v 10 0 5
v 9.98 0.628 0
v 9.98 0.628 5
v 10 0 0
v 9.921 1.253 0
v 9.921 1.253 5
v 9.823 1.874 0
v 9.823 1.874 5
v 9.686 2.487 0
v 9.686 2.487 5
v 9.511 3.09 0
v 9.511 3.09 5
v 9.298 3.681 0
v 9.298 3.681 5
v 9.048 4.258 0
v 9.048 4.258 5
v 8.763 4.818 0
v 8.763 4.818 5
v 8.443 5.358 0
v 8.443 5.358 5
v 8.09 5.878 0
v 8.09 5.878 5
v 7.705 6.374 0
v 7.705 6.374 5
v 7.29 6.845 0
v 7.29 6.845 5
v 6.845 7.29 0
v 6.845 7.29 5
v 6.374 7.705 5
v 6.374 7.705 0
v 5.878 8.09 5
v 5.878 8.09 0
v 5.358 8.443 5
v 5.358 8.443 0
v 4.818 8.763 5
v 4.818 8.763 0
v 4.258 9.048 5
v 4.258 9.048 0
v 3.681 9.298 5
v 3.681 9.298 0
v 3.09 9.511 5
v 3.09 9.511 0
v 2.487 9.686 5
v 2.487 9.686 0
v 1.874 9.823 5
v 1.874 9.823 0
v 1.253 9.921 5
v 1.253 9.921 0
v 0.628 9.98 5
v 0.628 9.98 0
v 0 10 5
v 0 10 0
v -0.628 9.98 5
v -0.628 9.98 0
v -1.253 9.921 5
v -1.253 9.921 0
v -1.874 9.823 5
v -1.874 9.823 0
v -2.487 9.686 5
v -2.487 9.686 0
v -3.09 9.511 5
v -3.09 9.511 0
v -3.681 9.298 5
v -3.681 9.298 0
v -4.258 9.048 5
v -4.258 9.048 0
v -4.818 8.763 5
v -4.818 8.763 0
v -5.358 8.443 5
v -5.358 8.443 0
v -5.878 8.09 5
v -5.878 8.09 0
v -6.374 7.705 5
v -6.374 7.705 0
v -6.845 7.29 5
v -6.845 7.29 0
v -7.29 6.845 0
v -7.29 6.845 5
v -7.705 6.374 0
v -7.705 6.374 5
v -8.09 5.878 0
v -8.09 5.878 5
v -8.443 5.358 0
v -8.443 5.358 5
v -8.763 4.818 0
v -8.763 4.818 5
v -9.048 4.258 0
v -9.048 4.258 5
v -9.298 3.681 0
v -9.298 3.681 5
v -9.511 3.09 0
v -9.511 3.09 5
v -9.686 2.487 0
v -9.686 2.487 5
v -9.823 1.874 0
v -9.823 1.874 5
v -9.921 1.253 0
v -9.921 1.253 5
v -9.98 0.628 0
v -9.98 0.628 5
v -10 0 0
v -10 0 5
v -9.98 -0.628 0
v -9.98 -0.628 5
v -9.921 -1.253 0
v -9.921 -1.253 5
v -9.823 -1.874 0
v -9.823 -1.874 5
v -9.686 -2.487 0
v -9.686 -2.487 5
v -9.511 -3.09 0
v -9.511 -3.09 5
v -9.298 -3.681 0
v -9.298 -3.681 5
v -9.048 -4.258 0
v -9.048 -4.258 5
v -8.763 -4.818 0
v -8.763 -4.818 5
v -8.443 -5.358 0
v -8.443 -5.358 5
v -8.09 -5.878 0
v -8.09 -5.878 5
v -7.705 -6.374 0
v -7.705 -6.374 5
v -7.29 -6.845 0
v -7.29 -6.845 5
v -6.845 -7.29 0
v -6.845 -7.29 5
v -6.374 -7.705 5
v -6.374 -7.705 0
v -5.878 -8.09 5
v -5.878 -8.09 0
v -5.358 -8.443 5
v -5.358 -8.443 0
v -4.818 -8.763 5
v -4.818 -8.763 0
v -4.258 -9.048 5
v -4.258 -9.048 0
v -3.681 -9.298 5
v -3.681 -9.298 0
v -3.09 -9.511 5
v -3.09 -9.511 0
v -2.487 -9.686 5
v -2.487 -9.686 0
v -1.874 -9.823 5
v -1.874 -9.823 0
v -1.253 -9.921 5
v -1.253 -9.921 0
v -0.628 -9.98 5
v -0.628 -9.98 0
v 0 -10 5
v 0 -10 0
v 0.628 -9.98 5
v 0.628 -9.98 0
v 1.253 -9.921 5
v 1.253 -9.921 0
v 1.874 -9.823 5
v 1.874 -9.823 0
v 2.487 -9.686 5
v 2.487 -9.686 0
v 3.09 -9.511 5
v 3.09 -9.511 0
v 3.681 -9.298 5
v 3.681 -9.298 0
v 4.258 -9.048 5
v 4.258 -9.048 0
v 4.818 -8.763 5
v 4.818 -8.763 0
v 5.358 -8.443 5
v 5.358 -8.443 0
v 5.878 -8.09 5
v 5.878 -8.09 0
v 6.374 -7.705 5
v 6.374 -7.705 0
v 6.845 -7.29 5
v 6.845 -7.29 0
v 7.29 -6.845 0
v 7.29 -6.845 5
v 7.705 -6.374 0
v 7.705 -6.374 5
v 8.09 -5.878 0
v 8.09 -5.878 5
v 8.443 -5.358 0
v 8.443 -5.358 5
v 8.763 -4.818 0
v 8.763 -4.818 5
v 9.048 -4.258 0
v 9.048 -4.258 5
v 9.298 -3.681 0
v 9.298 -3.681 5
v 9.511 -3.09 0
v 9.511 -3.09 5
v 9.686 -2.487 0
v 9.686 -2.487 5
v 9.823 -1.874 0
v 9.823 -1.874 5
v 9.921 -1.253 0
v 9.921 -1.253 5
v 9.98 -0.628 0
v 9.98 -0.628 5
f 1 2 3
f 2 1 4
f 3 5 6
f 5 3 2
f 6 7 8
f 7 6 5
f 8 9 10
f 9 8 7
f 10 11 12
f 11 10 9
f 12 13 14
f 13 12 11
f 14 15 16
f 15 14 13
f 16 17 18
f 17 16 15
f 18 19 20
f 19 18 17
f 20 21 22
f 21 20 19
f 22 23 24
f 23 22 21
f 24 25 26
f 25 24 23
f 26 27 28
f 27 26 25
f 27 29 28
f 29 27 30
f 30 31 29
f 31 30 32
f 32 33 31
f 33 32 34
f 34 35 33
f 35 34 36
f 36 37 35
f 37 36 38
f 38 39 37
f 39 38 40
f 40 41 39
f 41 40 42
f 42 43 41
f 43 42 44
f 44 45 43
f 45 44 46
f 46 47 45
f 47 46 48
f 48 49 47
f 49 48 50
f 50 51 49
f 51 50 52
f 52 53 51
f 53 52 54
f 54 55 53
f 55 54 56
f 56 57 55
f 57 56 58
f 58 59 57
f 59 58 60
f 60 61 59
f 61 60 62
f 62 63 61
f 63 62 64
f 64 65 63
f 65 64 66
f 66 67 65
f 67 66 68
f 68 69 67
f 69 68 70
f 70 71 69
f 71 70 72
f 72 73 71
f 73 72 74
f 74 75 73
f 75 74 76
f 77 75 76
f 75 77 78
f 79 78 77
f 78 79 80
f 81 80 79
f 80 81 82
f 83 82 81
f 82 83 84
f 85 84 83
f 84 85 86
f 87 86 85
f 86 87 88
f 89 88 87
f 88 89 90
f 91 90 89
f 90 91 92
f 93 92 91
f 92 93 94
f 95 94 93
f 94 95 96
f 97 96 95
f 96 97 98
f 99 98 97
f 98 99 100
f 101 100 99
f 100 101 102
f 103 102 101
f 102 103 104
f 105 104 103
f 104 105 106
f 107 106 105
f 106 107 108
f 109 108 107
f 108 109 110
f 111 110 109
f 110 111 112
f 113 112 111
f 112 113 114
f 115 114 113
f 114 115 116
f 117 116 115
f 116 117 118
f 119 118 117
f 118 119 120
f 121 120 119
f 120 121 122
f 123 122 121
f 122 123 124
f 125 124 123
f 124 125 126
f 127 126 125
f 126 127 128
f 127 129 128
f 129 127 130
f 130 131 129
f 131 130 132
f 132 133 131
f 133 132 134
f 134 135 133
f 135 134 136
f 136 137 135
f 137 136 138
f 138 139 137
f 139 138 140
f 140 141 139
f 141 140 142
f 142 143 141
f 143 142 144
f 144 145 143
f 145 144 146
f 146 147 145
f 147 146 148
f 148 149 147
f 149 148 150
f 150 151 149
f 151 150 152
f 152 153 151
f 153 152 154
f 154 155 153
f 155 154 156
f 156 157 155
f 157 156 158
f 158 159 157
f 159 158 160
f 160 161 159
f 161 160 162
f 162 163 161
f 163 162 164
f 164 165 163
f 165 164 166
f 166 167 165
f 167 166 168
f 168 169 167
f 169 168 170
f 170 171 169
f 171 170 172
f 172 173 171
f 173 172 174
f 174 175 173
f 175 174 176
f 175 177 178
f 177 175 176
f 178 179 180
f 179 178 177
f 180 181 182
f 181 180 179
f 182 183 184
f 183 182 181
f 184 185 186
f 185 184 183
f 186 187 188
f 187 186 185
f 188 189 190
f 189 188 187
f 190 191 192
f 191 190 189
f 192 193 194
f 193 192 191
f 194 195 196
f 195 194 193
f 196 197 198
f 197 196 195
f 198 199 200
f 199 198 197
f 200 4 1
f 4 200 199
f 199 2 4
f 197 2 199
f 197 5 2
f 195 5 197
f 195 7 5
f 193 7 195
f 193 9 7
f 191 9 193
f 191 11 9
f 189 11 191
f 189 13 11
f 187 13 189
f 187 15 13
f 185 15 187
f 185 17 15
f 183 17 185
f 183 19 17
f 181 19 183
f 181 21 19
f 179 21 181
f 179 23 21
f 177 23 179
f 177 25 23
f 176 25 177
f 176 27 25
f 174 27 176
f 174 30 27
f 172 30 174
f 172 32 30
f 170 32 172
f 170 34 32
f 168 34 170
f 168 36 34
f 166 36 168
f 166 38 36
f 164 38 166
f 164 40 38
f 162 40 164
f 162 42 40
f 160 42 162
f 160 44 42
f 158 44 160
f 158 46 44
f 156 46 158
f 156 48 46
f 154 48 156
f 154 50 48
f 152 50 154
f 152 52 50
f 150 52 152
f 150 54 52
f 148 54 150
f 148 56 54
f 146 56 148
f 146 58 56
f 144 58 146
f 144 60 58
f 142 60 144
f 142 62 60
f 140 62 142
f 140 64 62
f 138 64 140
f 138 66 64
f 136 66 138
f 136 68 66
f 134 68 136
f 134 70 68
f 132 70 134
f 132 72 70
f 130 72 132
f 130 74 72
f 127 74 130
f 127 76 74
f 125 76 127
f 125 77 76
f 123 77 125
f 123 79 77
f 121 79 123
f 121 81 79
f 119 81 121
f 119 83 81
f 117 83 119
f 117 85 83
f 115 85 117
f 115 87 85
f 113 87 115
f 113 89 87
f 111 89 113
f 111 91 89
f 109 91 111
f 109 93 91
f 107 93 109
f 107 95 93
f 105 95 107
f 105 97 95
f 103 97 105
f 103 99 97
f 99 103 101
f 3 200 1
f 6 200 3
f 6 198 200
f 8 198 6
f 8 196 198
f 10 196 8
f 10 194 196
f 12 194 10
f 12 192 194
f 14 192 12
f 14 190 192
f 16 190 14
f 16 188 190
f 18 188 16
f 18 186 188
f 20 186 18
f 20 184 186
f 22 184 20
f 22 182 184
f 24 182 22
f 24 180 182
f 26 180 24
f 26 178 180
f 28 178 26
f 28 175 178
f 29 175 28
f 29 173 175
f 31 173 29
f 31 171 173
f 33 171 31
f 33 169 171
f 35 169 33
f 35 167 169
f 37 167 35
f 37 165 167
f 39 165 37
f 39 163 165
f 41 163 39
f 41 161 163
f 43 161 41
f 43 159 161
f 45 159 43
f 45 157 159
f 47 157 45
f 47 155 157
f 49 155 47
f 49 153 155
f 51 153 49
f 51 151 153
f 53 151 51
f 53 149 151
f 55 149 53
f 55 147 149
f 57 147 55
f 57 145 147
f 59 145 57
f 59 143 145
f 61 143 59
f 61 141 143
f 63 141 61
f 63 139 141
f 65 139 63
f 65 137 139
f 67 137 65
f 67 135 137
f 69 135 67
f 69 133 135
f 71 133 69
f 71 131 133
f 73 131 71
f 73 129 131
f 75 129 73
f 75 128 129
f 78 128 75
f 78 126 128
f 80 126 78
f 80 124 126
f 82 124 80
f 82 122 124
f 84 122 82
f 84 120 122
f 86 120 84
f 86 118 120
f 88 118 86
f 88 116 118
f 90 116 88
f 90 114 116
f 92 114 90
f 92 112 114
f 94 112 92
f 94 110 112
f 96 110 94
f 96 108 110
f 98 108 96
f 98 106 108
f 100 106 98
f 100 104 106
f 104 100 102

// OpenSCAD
// file: ../configurations/global.scad
knob_facade_a_piece_height = 20;
knob_facade_a_piece_diameter = 20;
knob_facade_a_piece_wall_thickness = 2;

knob_facade_b_piece_height = 20;
knob_facade_b_piece_diameter = 20;
knob_facade_b_piece_wall_thickness = 2;

top_facade_piece_z_size = 5;
top_facade_piece_z_diameter = 20;
// main file
include <../configurations/global.scad>;

module TopFacadePiece(
    z_size = top_facade_piece_z_size,
    diameter = top_facade_piece_z_diameter,
) {
    cylinder(h = z_size, d = diameter, $fn=100);
}


TopFacadePiece();
